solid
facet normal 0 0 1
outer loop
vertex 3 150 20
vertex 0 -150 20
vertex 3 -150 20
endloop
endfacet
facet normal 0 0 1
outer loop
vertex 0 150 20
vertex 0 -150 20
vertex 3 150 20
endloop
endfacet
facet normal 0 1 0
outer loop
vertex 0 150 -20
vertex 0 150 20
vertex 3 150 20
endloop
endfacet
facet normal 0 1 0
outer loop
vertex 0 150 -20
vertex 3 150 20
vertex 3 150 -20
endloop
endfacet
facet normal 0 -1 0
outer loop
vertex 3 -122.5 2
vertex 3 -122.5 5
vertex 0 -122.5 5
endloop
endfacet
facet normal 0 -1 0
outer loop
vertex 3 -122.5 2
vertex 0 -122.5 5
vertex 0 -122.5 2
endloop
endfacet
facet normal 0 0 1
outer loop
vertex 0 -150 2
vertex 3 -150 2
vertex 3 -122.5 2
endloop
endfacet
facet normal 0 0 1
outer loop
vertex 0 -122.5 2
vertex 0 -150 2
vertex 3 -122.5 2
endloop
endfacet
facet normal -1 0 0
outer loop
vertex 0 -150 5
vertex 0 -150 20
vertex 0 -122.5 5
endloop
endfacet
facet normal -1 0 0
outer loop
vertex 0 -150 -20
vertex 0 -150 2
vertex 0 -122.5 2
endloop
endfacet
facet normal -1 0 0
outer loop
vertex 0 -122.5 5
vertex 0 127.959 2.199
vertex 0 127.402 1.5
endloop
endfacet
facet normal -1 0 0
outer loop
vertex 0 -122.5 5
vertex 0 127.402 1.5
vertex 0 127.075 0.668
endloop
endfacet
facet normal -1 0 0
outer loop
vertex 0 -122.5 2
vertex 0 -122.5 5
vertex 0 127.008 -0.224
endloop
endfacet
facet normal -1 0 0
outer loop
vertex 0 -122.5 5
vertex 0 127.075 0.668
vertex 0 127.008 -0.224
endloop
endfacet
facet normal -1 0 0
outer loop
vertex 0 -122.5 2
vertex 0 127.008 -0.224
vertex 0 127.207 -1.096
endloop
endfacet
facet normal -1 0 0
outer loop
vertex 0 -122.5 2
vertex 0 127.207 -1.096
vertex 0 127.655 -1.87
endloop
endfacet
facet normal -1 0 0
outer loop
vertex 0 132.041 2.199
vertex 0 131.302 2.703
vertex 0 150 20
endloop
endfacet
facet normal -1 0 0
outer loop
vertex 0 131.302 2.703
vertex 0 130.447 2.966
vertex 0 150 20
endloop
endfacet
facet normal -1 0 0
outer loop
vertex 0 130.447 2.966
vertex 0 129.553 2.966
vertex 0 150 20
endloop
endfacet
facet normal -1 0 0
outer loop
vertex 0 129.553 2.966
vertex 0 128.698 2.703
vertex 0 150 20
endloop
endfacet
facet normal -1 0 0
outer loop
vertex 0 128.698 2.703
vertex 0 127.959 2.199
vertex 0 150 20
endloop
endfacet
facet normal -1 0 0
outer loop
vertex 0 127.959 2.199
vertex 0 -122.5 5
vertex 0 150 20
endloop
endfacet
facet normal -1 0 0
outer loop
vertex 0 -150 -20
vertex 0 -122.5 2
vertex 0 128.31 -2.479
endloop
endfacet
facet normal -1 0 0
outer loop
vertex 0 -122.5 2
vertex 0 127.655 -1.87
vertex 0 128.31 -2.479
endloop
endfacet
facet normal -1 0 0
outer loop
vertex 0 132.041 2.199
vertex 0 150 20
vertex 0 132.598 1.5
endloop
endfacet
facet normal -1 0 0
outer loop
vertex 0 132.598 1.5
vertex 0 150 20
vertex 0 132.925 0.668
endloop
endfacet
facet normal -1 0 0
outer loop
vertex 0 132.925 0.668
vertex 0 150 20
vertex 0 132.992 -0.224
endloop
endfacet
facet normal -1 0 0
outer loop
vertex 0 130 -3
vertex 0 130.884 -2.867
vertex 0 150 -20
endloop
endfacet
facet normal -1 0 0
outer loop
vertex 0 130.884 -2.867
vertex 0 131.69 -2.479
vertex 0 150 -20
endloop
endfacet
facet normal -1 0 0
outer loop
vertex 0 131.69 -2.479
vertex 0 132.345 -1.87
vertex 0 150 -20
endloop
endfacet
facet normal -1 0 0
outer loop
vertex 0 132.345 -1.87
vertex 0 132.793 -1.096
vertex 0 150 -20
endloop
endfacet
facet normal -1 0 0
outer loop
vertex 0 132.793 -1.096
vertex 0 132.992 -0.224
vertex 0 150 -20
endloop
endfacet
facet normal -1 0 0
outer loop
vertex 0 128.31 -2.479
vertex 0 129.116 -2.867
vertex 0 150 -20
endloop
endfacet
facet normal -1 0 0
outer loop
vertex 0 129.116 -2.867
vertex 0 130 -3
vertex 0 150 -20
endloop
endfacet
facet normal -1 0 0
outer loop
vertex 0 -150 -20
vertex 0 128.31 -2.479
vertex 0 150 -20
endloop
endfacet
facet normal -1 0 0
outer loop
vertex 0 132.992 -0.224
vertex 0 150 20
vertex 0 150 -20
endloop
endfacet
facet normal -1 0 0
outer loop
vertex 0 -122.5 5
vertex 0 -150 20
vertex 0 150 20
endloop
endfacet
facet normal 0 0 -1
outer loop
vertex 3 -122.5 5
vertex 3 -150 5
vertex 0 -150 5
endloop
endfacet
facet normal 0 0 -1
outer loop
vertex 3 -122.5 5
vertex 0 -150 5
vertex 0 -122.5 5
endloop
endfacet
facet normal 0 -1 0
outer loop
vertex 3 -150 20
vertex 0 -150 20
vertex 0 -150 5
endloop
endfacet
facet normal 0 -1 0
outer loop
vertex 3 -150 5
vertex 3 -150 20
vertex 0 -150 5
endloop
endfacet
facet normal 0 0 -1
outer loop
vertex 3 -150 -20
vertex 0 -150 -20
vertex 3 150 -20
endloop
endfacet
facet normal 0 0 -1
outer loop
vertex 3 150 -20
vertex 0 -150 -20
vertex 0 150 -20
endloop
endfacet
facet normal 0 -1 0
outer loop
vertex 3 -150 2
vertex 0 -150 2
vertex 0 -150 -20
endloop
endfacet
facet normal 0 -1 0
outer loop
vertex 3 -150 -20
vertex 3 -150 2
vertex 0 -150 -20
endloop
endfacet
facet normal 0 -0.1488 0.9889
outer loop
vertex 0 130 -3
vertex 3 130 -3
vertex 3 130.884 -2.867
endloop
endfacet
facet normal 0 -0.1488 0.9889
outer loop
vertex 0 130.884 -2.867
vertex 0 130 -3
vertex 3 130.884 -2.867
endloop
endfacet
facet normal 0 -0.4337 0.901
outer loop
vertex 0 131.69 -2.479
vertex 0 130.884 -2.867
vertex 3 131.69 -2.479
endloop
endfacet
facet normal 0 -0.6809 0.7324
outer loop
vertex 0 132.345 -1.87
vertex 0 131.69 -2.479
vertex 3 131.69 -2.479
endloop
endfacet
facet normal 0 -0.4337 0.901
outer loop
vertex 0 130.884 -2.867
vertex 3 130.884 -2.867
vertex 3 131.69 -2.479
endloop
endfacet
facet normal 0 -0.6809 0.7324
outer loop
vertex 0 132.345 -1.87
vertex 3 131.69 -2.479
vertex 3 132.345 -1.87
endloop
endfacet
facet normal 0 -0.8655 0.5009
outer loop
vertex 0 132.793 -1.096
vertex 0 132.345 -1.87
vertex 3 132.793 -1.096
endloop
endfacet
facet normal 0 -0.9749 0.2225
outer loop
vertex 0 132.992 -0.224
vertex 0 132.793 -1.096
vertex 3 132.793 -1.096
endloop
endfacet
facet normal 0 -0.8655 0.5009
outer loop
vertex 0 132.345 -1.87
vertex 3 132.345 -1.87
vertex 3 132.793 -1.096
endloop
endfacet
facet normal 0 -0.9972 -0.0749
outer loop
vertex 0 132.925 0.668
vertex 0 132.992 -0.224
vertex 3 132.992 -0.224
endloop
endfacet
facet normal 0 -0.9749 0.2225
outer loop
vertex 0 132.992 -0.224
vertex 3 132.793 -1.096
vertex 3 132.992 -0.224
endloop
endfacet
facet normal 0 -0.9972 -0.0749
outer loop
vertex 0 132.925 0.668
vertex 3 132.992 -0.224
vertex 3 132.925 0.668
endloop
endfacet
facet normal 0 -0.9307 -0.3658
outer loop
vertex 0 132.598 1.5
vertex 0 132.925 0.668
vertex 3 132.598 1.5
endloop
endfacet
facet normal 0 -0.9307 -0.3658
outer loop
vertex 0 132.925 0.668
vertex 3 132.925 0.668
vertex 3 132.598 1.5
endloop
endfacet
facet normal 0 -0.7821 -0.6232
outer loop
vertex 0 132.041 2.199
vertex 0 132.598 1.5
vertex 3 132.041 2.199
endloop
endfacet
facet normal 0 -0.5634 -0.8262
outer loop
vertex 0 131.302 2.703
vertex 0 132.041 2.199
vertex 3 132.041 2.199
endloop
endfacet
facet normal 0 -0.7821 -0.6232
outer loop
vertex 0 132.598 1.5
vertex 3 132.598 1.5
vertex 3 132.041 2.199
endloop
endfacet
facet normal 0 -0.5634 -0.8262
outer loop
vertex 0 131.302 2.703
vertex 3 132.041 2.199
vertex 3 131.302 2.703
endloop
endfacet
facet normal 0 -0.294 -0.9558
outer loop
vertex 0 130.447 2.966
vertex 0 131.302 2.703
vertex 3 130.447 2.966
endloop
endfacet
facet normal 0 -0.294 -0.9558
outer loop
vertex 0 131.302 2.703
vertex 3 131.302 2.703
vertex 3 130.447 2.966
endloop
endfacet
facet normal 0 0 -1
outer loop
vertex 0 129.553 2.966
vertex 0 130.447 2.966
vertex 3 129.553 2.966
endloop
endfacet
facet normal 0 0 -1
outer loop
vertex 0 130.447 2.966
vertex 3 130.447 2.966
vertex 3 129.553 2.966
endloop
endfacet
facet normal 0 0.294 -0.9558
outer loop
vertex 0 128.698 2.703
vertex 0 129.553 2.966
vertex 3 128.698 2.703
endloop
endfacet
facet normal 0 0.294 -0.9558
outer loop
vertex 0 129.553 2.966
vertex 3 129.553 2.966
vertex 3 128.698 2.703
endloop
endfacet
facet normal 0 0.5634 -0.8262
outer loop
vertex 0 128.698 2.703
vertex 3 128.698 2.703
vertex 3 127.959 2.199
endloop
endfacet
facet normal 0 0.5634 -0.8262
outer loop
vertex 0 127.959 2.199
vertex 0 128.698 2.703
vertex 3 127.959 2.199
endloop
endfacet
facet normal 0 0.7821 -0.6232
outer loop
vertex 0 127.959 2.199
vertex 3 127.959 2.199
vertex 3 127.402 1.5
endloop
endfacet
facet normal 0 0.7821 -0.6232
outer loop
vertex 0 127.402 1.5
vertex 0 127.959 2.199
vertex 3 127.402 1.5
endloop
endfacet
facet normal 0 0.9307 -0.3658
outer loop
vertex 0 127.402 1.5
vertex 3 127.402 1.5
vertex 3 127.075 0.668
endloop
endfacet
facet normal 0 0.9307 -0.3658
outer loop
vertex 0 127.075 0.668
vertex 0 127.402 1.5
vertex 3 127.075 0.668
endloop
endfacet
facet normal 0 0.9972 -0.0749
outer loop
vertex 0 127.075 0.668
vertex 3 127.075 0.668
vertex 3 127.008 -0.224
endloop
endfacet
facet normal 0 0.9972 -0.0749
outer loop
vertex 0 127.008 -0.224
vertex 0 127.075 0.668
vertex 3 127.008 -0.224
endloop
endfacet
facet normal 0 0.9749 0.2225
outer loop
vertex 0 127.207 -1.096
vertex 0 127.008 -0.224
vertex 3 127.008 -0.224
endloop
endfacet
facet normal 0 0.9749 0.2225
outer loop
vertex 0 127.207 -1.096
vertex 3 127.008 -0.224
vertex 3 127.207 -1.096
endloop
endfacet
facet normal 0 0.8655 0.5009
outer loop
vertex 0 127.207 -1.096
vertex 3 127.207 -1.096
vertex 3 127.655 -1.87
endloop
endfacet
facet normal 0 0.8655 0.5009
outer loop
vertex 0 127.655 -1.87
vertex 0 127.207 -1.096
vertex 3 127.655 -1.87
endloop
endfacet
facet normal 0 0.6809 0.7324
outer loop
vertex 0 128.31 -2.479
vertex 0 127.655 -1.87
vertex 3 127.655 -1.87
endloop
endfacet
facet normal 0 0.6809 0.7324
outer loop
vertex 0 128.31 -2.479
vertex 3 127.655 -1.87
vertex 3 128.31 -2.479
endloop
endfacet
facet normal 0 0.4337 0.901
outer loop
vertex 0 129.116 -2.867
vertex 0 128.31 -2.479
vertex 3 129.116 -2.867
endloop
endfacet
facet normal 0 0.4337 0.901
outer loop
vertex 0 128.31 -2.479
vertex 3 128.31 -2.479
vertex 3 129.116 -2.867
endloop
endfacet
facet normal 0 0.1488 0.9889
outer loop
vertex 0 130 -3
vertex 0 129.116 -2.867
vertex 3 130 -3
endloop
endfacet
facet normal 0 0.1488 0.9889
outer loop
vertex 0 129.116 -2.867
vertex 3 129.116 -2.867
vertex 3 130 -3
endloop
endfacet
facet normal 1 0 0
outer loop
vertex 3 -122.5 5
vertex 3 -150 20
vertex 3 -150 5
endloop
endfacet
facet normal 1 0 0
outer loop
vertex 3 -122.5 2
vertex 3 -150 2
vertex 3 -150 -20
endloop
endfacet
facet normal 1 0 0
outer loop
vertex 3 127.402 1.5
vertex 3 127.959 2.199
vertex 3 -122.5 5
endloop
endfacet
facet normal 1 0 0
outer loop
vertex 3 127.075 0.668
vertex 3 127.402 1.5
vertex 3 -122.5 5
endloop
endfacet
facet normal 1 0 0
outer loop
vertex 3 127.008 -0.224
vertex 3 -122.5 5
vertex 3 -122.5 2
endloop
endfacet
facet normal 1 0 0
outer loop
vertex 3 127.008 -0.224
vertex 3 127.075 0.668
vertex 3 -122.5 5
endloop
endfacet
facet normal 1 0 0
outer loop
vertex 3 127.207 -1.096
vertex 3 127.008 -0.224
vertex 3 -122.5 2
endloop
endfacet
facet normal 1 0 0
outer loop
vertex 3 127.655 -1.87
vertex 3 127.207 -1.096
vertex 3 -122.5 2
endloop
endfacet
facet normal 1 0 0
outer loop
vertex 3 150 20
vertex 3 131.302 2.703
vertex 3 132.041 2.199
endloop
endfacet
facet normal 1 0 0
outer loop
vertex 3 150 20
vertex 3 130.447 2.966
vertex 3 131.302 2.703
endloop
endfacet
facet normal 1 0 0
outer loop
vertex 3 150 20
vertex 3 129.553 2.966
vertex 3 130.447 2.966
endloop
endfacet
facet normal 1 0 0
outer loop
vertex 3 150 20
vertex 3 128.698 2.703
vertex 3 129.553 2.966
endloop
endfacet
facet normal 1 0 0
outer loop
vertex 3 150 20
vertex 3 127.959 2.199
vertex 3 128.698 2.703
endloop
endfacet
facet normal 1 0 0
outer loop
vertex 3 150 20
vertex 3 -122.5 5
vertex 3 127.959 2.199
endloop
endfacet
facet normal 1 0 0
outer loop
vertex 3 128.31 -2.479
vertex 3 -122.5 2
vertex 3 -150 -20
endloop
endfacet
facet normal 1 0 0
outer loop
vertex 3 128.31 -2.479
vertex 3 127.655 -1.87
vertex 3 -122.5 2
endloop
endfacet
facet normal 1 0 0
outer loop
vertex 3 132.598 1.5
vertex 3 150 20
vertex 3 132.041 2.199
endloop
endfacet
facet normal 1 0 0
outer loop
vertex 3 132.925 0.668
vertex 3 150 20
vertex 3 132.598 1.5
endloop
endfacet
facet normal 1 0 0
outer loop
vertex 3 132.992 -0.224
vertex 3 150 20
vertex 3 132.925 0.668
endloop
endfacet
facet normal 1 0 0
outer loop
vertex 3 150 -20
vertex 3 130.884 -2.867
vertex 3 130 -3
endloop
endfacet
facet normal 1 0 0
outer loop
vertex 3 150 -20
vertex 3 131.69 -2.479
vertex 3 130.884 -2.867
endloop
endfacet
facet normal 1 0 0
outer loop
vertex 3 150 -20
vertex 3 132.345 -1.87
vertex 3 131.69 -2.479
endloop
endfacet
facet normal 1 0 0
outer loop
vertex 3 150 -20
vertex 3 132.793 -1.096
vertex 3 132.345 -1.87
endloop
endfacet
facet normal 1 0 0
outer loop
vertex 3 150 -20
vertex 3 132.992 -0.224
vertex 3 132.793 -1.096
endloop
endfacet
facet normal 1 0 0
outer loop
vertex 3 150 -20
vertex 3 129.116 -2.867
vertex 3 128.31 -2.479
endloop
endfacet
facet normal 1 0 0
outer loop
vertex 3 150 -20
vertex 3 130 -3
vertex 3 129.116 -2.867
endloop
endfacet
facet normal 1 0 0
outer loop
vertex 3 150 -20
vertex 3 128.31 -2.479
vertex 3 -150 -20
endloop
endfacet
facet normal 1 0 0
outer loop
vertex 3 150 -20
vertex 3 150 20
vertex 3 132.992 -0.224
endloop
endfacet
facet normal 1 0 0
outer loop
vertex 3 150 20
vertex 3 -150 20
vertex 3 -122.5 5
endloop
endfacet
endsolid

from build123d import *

# Parameters (mm, degrees)
SKETCH1_W           = 40
SKETCH1_H           = 300
BOSS_EXTRUDE1_DEPTH = 3
SKETCH2_R           = 3
CUT_EXTRUDE1_DEPTH  = 3
SKETCH3_W           = 3
SKETCH3_H           = 27.5
CUT_EXTRUDE2_DEPTH  = 3


with BuildPart() as part:
    # Sketch1 → Boss-Extrude1 (new body)
    with BuildSketch(Plane(origin=(0, 0, 0), x_dir=(0, 0, -1), z_dir=(1, 0, 0))):
        Rectangle(SKETCH1_W, SKETCH1_H)
    extrude(amount=BOSS_EXTRUDE1_DEPTH)

    # Sketch2 → Cut-Extrude1 (cut)
    with BuildSketch(Plane(origin=(3, 0, 0), x_dir=(0, 0, -1), z_dir=(1, 0, 0))):
        with Locations((0, 130)):
            Circle(SKETCH2_R)
    extrude(amount=-CUT_EXTRUDE1_DEPTH, mode=Mode.SUBTRACT)

    # Sketch3 → Cut-Extrude2 (cut)
    with BuildSketch(Plane(origin=(3, 0, 0), x_dir=(0, 0, -1), z_dir=(1, 0, 0))):
        with Locations((-3.5, -136.25)):
            Rectangle(SKETCH3_W, SKETCH3_H)
    extrude(amount=-CUT_EXTRUDE2_DEPTH, mode=Mode.SUBTRACT)


solid = part.part
